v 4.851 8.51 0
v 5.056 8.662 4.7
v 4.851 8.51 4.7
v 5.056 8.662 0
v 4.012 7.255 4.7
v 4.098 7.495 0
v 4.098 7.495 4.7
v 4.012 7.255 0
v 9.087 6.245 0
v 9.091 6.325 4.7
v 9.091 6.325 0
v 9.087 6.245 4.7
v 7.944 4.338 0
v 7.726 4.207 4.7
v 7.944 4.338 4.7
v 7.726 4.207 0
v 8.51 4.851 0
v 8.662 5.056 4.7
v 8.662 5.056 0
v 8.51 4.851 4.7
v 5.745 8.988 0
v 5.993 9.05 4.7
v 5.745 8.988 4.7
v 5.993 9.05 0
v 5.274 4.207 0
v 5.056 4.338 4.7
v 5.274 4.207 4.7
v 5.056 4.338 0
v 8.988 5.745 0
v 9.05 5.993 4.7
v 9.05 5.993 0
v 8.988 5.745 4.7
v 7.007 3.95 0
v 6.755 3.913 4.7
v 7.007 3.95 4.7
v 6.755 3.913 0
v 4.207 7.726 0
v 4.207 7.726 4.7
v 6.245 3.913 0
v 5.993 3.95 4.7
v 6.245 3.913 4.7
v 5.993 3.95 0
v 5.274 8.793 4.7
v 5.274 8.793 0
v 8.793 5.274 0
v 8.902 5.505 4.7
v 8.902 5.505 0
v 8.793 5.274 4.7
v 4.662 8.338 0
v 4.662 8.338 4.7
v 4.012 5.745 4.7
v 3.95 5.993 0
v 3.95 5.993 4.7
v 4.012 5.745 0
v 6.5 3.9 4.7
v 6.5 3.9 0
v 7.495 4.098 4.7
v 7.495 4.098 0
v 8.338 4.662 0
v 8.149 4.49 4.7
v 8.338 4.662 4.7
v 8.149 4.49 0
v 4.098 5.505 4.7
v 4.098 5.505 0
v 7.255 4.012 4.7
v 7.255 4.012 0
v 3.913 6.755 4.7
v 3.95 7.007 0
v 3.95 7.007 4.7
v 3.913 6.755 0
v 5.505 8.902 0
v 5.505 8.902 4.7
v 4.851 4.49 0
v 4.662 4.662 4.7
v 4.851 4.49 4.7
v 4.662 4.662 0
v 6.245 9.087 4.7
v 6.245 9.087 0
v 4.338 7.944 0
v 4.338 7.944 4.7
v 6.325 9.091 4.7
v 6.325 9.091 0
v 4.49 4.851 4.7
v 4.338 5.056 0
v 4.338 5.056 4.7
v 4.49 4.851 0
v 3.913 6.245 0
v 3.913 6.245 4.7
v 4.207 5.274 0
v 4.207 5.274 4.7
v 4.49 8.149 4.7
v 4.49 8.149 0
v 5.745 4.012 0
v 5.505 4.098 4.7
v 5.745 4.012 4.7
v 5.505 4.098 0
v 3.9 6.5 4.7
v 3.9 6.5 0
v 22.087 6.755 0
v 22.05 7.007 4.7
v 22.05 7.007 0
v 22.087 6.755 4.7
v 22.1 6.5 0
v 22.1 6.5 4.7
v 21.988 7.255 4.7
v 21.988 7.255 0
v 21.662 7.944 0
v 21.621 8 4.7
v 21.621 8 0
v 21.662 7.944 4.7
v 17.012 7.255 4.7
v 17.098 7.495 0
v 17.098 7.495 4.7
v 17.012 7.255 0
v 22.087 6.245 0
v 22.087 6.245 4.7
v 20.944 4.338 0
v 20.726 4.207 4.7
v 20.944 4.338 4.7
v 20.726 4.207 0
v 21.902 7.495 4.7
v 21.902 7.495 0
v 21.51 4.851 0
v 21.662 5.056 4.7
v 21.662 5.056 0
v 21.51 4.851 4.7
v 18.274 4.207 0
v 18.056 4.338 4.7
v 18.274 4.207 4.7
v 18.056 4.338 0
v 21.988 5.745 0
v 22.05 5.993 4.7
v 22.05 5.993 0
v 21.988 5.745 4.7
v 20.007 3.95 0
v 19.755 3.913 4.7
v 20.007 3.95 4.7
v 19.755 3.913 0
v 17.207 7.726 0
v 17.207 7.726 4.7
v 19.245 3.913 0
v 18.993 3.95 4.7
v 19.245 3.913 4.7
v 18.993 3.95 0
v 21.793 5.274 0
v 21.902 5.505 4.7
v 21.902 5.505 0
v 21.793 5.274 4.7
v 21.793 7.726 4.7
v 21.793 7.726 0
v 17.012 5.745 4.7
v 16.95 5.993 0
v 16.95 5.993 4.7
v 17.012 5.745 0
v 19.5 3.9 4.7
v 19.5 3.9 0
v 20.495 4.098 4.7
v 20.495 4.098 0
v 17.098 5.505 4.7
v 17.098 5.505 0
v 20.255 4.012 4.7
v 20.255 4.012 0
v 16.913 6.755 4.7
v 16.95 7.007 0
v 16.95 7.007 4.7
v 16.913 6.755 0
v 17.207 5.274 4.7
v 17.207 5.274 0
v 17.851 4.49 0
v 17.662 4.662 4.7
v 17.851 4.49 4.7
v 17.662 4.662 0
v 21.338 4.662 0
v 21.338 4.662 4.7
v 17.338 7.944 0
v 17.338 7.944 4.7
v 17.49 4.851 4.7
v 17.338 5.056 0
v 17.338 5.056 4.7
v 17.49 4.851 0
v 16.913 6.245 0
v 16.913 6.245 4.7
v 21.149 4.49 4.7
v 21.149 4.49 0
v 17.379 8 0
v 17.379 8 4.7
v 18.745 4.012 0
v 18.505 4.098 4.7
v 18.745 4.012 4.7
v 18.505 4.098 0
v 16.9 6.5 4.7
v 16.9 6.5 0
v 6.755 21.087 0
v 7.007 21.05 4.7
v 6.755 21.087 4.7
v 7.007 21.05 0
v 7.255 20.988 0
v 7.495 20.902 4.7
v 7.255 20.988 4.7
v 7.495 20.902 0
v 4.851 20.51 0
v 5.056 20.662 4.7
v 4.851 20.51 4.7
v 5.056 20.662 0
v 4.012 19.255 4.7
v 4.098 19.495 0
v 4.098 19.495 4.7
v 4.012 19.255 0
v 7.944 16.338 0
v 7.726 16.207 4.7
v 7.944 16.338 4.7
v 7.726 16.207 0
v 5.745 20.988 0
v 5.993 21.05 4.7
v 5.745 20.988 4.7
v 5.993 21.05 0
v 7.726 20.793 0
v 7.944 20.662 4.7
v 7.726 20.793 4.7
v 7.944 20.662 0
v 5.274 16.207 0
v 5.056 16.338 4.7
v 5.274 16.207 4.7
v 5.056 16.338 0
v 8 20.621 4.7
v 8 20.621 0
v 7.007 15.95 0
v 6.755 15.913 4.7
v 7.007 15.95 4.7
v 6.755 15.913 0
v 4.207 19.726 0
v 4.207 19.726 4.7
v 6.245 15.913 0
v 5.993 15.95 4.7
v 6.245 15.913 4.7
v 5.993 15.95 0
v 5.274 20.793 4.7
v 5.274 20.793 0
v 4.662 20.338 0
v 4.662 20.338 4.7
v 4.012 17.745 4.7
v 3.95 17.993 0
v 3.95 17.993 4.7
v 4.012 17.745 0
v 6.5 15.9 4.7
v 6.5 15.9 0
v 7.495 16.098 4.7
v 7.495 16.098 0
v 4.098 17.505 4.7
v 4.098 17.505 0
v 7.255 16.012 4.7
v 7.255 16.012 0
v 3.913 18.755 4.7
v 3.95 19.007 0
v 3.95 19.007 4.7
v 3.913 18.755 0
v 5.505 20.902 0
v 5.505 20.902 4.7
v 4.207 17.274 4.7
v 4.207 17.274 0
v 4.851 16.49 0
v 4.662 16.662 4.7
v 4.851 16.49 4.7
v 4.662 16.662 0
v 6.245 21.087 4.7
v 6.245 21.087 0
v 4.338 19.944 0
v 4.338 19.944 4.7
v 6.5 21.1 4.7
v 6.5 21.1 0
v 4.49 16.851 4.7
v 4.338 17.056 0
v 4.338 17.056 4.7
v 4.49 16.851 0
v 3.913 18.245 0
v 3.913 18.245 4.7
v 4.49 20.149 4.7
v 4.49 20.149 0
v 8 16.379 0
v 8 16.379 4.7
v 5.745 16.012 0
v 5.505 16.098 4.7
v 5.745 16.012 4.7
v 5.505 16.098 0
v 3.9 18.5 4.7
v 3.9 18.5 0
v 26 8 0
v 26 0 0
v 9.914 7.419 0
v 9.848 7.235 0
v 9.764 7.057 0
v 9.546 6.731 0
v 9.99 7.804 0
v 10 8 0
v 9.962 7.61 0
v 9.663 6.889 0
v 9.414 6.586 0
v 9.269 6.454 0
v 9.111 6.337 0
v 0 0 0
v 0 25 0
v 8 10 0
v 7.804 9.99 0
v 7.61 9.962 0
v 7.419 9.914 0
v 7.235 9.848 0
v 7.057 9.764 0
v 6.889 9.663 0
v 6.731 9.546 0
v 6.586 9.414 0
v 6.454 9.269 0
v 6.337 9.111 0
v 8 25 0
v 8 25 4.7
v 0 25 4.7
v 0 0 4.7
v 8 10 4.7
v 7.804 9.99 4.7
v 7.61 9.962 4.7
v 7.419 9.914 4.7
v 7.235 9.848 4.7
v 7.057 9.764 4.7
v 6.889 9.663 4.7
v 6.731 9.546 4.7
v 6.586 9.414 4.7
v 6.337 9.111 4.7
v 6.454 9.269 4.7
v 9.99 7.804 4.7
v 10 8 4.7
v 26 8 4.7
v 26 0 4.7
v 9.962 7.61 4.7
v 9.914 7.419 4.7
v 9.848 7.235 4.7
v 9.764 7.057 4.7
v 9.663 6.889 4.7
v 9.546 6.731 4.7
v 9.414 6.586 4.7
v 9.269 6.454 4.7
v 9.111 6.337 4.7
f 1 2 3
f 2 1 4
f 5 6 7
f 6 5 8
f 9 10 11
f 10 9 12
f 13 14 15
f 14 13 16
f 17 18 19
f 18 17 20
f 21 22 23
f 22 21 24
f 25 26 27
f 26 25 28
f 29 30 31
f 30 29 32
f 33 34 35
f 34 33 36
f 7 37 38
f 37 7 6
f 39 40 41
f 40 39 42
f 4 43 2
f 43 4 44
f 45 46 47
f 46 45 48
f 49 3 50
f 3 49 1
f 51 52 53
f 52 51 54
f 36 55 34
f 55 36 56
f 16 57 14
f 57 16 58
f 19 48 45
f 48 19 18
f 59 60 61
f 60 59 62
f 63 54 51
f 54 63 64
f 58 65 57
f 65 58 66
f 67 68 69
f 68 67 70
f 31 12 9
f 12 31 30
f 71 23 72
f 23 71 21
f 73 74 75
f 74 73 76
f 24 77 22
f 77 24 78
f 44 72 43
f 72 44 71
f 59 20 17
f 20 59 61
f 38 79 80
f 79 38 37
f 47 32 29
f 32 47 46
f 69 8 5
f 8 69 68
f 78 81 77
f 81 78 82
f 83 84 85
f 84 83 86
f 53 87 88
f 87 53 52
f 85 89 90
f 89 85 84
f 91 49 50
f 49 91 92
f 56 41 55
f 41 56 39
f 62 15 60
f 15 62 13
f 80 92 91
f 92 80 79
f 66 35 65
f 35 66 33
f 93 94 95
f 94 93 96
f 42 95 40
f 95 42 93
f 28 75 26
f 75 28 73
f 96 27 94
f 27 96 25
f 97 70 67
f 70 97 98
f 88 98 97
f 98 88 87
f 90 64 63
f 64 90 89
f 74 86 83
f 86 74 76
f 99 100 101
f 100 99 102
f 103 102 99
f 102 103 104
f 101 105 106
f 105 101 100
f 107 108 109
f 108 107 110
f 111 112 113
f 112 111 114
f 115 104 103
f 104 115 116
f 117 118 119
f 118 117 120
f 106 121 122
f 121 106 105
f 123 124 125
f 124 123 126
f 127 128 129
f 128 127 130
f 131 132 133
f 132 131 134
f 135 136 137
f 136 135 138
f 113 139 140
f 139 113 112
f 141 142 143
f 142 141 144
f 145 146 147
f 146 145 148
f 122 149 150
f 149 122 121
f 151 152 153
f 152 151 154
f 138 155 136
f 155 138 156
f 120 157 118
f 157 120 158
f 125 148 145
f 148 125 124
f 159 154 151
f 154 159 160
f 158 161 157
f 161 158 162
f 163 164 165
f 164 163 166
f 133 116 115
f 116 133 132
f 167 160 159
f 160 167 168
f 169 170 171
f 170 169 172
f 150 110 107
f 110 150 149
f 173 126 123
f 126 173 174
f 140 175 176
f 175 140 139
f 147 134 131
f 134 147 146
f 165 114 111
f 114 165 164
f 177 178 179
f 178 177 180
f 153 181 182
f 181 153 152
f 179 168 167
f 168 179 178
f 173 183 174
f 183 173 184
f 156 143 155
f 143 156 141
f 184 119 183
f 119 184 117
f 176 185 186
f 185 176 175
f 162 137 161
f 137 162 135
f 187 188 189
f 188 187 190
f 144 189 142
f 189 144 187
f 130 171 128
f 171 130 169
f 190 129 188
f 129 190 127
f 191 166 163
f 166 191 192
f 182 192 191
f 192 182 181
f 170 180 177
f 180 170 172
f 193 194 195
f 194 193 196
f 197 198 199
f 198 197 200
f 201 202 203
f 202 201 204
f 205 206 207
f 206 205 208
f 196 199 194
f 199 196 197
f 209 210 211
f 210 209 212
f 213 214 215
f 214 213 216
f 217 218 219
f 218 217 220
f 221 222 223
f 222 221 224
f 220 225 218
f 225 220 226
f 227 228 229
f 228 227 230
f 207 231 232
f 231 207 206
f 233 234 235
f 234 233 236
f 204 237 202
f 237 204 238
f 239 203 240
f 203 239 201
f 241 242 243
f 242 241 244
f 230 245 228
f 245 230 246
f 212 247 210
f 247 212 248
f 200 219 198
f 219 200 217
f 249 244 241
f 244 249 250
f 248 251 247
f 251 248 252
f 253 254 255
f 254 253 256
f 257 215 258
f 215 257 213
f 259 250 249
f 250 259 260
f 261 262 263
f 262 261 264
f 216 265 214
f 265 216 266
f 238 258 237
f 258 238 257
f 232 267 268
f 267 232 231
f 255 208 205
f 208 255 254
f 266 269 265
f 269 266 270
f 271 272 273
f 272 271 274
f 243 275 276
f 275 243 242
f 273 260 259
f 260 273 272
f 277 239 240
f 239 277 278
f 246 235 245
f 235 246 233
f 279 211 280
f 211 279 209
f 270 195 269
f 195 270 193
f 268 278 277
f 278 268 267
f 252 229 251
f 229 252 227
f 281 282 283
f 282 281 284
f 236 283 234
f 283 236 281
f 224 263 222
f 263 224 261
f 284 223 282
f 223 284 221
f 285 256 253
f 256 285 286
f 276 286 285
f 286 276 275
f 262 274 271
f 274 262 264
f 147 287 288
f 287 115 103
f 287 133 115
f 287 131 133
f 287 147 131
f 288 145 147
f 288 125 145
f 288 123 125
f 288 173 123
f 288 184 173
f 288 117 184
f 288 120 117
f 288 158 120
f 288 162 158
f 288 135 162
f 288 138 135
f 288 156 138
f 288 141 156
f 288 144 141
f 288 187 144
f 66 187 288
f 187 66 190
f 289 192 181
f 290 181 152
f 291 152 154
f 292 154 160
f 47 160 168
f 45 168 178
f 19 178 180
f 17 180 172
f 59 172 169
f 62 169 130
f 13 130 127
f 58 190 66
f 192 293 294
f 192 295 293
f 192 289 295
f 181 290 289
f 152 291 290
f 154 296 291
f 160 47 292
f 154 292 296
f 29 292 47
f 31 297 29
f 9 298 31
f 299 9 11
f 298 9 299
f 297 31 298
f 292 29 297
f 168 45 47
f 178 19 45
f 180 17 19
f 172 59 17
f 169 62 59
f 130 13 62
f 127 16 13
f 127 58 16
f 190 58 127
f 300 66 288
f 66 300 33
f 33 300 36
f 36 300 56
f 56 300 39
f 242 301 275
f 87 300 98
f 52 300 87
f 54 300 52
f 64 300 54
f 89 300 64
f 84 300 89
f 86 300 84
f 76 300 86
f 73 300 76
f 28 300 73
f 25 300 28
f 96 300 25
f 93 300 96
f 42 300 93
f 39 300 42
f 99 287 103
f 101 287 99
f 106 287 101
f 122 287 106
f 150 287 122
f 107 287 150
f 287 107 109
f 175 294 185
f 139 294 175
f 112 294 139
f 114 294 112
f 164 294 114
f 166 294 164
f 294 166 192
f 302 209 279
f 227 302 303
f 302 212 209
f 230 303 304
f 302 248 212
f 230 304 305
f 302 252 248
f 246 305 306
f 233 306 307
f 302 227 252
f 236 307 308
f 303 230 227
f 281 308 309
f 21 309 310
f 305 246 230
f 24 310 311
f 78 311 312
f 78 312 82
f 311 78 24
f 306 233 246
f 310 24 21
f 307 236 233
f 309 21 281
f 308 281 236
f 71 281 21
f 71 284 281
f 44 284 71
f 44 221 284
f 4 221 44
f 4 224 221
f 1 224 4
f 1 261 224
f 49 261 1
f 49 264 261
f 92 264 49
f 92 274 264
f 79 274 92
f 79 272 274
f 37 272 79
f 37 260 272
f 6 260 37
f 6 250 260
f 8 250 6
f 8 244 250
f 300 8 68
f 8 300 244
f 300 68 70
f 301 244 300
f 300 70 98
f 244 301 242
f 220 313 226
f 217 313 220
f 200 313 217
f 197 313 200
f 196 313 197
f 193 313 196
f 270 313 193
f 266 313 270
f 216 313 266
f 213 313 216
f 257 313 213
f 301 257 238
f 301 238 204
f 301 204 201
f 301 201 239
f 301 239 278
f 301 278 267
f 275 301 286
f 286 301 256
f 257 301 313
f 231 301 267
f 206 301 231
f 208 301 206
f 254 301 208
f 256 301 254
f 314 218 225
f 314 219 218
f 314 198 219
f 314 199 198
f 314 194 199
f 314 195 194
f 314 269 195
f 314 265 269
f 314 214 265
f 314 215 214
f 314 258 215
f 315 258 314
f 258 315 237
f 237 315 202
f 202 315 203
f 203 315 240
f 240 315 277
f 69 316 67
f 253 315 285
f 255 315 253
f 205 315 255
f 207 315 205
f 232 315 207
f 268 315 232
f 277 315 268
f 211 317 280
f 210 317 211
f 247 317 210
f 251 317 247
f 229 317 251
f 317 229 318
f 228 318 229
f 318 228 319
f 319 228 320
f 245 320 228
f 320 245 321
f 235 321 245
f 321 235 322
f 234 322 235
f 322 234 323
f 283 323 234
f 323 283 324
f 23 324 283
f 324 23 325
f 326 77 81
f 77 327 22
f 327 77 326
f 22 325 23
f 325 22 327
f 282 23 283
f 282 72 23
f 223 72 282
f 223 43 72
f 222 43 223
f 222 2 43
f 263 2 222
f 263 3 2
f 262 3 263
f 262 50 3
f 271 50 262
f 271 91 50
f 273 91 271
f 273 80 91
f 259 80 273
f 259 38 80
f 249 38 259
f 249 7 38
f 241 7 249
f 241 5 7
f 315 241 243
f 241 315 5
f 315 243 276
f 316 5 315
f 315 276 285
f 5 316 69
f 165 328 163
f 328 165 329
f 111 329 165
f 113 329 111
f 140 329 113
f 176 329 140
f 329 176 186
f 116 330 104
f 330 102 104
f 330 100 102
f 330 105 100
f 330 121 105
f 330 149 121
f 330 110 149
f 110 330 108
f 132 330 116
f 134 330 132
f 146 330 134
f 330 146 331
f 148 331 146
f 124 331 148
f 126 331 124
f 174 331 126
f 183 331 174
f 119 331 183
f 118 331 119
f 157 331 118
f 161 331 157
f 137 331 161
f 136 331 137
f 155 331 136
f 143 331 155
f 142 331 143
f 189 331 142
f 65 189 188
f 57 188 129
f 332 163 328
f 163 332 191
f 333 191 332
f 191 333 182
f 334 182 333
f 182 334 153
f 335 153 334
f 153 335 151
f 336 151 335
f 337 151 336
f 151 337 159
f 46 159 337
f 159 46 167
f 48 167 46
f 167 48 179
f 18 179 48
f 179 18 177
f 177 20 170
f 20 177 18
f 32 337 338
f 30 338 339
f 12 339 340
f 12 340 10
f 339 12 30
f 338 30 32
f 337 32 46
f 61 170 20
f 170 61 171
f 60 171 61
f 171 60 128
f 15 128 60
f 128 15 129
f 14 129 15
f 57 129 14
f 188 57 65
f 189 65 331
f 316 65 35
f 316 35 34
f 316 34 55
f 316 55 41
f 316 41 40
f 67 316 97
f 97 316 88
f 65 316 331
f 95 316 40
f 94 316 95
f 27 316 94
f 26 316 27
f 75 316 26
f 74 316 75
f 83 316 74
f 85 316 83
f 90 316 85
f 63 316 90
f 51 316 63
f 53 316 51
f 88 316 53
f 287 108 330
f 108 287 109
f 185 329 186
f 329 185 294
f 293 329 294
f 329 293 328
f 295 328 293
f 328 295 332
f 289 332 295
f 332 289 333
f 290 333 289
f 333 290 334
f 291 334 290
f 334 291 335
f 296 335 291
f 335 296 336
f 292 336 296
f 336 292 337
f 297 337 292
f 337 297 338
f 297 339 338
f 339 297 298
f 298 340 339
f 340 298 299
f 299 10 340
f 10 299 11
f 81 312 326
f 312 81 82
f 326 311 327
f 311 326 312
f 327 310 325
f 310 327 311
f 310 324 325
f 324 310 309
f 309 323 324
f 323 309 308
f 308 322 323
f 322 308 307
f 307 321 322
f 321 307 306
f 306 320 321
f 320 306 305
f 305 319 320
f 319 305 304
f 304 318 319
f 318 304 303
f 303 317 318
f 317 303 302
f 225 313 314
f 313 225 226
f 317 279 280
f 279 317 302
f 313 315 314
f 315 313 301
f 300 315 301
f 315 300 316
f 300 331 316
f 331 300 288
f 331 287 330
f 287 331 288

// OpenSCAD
$fn = 64;

// Overall bounding size must match: [26, 25, 4.7]
size = [26, 25, 4.7];
W = size[0];
H = size[1];
T = size[2];

// Bracket geometry (kept within the bounding box)
leg = 8;                 // width of each leg of the L
corner_r = 2;            // inner corner relief radius
hole_d = 5.2;            // clearance hole
hole_edge = 6.5;         // hole center distance from each outer edge

module l_bracket_2d() {
    difference() {
        union() {
            square([W, leg], center=false);   // bottom leg
            square([leg, H], center=false);   // left leg
        }
        // inner corner relief to emphasize bracket shape
        translate([leg, leg])
            circle(r=corner_r);
    }
}

difference() {
    // L-shaped extrusion bracket plate, extruded to thickness T
    linear_extrude(height=T, center=false)
        l_bracket_2d();

    // Two mounting holes (one per leg), fully through
    for (p = [
        [hole_edge, hole_edge],                 // near corner on bottom leg
        [W - hole_edge, hole_edge]              // along bottom leg toward right
    ]) {
        translate([p[0], p[1], -0.1])
            cylinder(h=T + 0.2, d=hole_d, center=false);
    }

    for (p = [
        [hole_edge, H - hole_edge],             // along left leg toward top
        [hole_edge, hole_edge]                  // shared corner hole (overlaps; subtracting twice is fine)
    ]) {
        translate([p[0], p[1], -0.1])
            cylinder(h=T + 0.2, d=hole_d, center=false);
    }
}
